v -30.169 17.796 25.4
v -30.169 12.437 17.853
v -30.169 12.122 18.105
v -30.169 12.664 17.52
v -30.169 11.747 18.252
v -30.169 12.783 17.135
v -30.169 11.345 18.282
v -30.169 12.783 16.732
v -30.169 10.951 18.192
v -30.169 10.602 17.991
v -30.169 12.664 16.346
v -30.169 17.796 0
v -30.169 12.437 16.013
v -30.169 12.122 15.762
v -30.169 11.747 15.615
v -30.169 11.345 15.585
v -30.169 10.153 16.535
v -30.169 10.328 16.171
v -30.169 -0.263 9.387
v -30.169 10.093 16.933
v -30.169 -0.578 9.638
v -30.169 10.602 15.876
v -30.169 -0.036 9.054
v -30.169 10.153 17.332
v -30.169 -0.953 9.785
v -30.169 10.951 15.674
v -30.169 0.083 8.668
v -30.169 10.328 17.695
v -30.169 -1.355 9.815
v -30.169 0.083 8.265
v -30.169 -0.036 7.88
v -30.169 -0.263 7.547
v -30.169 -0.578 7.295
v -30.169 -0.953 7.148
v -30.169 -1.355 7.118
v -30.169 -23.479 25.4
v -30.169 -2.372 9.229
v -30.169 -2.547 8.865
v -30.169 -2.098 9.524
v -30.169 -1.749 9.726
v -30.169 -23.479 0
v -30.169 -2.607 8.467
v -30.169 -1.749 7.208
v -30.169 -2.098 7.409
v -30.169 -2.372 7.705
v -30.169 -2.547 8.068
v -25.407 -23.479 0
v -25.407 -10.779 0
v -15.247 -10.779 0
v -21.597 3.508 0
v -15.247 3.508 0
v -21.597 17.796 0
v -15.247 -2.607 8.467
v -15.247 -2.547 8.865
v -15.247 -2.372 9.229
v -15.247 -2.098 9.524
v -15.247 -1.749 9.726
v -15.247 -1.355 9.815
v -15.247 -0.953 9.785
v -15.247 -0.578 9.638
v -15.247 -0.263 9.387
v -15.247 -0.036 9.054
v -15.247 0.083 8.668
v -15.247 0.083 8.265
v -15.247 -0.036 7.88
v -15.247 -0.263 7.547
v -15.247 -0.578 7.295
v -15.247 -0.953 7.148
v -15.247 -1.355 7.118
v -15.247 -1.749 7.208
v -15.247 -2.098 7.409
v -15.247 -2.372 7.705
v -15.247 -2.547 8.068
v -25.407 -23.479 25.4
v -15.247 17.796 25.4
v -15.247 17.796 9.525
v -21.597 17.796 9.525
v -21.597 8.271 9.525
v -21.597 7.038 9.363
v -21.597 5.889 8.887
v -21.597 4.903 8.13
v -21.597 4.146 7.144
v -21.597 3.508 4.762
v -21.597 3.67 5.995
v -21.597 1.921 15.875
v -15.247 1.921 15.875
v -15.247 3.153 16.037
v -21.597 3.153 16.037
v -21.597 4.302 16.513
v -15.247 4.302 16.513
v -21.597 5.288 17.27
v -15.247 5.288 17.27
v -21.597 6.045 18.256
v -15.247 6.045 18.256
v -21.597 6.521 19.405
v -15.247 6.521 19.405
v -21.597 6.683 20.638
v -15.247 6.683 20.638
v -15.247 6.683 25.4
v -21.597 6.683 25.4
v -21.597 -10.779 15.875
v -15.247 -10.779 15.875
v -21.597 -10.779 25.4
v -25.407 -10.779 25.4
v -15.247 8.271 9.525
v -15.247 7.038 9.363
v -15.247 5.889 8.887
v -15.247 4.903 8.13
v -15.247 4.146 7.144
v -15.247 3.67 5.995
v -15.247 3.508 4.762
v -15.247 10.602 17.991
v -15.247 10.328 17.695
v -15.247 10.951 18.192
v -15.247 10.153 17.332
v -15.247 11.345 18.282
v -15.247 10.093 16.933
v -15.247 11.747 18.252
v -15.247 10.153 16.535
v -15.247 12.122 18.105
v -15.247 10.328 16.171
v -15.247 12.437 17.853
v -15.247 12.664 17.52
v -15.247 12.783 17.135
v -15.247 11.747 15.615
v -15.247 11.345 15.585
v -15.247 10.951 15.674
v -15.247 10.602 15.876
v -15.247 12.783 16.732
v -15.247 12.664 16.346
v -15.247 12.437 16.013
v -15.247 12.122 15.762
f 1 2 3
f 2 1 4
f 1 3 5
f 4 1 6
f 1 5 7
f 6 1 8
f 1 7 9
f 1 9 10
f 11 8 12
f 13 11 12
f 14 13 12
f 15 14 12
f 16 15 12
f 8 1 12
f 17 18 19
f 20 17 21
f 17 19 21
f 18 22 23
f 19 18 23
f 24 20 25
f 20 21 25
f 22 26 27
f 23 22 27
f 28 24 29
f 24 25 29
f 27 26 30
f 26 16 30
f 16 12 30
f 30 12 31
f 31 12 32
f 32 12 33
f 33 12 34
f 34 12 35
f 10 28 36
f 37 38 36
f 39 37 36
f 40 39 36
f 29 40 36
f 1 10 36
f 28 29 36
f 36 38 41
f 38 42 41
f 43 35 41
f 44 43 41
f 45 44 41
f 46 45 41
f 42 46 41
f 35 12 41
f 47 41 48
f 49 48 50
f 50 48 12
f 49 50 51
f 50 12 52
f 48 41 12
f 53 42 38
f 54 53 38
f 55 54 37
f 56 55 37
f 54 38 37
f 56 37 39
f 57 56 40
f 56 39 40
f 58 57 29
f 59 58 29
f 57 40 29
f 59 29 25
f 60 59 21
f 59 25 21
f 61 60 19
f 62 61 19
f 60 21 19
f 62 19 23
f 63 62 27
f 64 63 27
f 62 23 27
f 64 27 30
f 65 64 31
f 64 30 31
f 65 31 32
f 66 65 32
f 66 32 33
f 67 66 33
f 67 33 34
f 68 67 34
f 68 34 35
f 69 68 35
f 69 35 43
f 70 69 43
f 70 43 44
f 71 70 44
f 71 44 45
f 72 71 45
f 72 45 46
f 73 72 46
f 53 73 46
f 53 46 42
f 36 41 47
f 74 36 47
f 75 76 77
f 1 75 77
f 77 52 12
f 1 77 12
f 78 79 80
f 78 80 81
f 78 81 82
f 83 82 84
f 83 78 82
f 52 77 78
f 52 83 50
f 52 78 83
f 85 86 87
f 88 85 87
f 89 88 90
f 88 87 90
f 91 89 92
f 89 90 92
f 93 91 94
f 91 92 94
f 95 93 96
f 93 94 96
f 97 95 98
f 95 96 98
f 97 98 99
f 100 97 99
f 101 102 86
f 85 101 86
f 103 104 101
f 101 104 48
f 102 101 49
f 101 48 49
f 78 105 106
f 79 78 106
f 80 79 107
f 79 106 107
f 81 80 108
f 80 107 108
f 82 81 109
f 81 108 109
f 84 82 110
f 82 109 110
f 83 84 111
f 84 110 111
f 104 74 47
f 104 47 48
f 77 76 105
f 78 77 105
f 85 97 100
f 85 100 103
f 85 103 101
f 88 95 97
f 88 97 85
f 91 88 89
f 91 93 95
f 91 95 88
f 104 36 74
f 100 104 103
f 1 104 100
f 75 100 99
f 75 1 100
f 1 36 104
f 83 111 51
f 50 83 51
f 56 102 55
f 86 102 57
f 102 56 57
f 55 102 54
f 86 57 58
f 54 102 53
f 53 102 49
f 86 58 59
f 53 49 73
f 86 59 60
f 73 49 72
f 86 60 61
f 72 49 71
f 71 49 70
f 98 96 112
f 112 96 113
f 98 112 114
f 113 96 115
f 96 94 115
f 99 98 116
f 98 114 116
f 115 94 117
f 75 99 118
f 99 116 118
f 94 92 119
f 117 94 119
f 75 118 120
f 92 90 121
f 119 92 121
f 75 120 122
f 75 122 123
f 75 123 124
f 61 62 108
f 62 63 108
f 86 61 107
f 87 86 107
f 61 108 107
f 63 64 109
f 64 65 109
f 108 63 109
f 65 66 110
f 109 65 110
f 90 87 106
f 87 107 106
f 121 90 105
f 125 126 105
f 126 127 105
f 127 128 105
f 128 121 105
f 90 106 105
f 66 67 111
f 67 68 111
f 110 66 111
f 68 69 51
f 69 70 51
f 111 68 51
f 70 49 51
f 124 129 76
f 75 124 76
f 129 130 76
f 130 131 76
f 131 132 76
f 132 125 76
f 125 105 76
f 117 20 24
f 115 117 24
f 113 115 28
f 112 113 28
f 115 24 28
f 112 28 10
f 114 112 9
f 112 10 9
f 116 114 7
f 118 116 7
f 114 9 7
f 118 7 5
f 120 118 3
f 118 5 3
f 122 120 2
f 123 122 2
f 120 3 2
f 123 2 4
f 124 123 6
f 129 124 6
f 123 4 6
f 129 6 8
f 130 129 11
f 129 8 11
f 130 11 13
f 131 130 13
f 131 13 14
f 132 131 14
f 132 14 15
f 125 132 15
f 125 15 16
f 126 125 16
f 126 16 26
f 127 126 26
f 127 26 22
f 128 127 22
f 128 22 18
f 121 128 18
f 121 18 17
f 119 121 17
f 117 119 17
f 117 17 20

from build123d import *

# Parameters (mm, degrees)
BOSS_EXTRUDE1_DEPTH       = 25.4
TAP_DRILL_FOR_6_32_TAP1_D = 2.7051
SKETCH5_R                 = 4.7625
CUT_EXTRUDE1_DEPTH        = 6.35


with BuildPart() as part:
    # Sketch1 → Boss-Extrude1 (new body)
    with BuildSketch(Plane.XY):
        Polygon((-30.169054899, -23.479397625), (-25.406554899, -23.479397625), (-25.406554899, -10.779397625), (-15.246554899, -10.779397625), (-15.246554899, -7.604397625), (-15.246554899, 17.795602375), (-30.169054899, 17.795602375), (-30.169054899, -7.604397625), align=None)
    extrude(amount=BOSS_EXTRUDE1_DEPTH)

    # Tap Drill for #6-32 Tap1 (through all)
    with Locations(Plane(origin=(-15.246554899, 11.445602375, 16.933333333), x_dir=(0, 1, 0), z_dir=(1, 0, 0))):
        with Locations((0, 0), (-12.7, -8.466666666)):
            Hole(TAP_DRILL_FOR_6_32_TAP1_D / 2)

    # Sketch5 → Cut-Extrude1 (cut)
    with BuildSketch(Plane(origin=(-15.246554899, 0, 0), x_dir=(0, 0, -1), z_dir=(1, 0, 0))):
        with Locations((-20.6375, 1.920602375)):
            Circle(SKETCH5_R)
        with BuildLine():
            ThreePointArc((-25.4, 1.920602382), (-24.005096043, 5.288198423), (-20.6375, 6.683102375))
            Line((-20.6375, 6.683102375), (-25.4, 6.683102375))
            Line((-25.4, 6.683102375), (-25.4, 1.920602382))
        make_face()
        with BuildLine():
            Line((-15.875, -10.779397625), (-15.875, 1.920602375))
            ThreePointArc((-15.875, 1.920602375), (-20.637500004, -2.841897625), (-25.4, 1.920602382))
            Line((-25.4, 1.920602382), (-25.4, -10.779397625))
            Line((-25.4, -10.779397625), (-15.875, -10.779397625))
        make_face()
        with BuildLine():
            Line((0, 17.795602375), (-9.525, 17.795602375))
            Line((-9.525, 17.795602375), (-9.525, 8.270602375))
            ThreePointArc((-9.525, 8.270602375), (-4.7625, 13.033102375), (0, 8.270602375))
            Line((0, 8.270602375), (0, 17.795602375))
        make_face()
        with Locations((-4.7625, 8.270602375)):
            Circle(SKETCH5_R)
        with BuildLine():
            Line((-4.7625, 3.508102375), (0, 3.508102375))
            Line((0, 3.508102375), (0, 8.270602375))
            ThreePointArc((0, 8.270602375), (-1.394903955, 4.90300633), (-4.7625, 3.508102375))
        make_face()
    extrude(amount=-CUT_EXTRUDE1_DEPTH, mode=Mode.SUBTRACT)


solid = part.part
